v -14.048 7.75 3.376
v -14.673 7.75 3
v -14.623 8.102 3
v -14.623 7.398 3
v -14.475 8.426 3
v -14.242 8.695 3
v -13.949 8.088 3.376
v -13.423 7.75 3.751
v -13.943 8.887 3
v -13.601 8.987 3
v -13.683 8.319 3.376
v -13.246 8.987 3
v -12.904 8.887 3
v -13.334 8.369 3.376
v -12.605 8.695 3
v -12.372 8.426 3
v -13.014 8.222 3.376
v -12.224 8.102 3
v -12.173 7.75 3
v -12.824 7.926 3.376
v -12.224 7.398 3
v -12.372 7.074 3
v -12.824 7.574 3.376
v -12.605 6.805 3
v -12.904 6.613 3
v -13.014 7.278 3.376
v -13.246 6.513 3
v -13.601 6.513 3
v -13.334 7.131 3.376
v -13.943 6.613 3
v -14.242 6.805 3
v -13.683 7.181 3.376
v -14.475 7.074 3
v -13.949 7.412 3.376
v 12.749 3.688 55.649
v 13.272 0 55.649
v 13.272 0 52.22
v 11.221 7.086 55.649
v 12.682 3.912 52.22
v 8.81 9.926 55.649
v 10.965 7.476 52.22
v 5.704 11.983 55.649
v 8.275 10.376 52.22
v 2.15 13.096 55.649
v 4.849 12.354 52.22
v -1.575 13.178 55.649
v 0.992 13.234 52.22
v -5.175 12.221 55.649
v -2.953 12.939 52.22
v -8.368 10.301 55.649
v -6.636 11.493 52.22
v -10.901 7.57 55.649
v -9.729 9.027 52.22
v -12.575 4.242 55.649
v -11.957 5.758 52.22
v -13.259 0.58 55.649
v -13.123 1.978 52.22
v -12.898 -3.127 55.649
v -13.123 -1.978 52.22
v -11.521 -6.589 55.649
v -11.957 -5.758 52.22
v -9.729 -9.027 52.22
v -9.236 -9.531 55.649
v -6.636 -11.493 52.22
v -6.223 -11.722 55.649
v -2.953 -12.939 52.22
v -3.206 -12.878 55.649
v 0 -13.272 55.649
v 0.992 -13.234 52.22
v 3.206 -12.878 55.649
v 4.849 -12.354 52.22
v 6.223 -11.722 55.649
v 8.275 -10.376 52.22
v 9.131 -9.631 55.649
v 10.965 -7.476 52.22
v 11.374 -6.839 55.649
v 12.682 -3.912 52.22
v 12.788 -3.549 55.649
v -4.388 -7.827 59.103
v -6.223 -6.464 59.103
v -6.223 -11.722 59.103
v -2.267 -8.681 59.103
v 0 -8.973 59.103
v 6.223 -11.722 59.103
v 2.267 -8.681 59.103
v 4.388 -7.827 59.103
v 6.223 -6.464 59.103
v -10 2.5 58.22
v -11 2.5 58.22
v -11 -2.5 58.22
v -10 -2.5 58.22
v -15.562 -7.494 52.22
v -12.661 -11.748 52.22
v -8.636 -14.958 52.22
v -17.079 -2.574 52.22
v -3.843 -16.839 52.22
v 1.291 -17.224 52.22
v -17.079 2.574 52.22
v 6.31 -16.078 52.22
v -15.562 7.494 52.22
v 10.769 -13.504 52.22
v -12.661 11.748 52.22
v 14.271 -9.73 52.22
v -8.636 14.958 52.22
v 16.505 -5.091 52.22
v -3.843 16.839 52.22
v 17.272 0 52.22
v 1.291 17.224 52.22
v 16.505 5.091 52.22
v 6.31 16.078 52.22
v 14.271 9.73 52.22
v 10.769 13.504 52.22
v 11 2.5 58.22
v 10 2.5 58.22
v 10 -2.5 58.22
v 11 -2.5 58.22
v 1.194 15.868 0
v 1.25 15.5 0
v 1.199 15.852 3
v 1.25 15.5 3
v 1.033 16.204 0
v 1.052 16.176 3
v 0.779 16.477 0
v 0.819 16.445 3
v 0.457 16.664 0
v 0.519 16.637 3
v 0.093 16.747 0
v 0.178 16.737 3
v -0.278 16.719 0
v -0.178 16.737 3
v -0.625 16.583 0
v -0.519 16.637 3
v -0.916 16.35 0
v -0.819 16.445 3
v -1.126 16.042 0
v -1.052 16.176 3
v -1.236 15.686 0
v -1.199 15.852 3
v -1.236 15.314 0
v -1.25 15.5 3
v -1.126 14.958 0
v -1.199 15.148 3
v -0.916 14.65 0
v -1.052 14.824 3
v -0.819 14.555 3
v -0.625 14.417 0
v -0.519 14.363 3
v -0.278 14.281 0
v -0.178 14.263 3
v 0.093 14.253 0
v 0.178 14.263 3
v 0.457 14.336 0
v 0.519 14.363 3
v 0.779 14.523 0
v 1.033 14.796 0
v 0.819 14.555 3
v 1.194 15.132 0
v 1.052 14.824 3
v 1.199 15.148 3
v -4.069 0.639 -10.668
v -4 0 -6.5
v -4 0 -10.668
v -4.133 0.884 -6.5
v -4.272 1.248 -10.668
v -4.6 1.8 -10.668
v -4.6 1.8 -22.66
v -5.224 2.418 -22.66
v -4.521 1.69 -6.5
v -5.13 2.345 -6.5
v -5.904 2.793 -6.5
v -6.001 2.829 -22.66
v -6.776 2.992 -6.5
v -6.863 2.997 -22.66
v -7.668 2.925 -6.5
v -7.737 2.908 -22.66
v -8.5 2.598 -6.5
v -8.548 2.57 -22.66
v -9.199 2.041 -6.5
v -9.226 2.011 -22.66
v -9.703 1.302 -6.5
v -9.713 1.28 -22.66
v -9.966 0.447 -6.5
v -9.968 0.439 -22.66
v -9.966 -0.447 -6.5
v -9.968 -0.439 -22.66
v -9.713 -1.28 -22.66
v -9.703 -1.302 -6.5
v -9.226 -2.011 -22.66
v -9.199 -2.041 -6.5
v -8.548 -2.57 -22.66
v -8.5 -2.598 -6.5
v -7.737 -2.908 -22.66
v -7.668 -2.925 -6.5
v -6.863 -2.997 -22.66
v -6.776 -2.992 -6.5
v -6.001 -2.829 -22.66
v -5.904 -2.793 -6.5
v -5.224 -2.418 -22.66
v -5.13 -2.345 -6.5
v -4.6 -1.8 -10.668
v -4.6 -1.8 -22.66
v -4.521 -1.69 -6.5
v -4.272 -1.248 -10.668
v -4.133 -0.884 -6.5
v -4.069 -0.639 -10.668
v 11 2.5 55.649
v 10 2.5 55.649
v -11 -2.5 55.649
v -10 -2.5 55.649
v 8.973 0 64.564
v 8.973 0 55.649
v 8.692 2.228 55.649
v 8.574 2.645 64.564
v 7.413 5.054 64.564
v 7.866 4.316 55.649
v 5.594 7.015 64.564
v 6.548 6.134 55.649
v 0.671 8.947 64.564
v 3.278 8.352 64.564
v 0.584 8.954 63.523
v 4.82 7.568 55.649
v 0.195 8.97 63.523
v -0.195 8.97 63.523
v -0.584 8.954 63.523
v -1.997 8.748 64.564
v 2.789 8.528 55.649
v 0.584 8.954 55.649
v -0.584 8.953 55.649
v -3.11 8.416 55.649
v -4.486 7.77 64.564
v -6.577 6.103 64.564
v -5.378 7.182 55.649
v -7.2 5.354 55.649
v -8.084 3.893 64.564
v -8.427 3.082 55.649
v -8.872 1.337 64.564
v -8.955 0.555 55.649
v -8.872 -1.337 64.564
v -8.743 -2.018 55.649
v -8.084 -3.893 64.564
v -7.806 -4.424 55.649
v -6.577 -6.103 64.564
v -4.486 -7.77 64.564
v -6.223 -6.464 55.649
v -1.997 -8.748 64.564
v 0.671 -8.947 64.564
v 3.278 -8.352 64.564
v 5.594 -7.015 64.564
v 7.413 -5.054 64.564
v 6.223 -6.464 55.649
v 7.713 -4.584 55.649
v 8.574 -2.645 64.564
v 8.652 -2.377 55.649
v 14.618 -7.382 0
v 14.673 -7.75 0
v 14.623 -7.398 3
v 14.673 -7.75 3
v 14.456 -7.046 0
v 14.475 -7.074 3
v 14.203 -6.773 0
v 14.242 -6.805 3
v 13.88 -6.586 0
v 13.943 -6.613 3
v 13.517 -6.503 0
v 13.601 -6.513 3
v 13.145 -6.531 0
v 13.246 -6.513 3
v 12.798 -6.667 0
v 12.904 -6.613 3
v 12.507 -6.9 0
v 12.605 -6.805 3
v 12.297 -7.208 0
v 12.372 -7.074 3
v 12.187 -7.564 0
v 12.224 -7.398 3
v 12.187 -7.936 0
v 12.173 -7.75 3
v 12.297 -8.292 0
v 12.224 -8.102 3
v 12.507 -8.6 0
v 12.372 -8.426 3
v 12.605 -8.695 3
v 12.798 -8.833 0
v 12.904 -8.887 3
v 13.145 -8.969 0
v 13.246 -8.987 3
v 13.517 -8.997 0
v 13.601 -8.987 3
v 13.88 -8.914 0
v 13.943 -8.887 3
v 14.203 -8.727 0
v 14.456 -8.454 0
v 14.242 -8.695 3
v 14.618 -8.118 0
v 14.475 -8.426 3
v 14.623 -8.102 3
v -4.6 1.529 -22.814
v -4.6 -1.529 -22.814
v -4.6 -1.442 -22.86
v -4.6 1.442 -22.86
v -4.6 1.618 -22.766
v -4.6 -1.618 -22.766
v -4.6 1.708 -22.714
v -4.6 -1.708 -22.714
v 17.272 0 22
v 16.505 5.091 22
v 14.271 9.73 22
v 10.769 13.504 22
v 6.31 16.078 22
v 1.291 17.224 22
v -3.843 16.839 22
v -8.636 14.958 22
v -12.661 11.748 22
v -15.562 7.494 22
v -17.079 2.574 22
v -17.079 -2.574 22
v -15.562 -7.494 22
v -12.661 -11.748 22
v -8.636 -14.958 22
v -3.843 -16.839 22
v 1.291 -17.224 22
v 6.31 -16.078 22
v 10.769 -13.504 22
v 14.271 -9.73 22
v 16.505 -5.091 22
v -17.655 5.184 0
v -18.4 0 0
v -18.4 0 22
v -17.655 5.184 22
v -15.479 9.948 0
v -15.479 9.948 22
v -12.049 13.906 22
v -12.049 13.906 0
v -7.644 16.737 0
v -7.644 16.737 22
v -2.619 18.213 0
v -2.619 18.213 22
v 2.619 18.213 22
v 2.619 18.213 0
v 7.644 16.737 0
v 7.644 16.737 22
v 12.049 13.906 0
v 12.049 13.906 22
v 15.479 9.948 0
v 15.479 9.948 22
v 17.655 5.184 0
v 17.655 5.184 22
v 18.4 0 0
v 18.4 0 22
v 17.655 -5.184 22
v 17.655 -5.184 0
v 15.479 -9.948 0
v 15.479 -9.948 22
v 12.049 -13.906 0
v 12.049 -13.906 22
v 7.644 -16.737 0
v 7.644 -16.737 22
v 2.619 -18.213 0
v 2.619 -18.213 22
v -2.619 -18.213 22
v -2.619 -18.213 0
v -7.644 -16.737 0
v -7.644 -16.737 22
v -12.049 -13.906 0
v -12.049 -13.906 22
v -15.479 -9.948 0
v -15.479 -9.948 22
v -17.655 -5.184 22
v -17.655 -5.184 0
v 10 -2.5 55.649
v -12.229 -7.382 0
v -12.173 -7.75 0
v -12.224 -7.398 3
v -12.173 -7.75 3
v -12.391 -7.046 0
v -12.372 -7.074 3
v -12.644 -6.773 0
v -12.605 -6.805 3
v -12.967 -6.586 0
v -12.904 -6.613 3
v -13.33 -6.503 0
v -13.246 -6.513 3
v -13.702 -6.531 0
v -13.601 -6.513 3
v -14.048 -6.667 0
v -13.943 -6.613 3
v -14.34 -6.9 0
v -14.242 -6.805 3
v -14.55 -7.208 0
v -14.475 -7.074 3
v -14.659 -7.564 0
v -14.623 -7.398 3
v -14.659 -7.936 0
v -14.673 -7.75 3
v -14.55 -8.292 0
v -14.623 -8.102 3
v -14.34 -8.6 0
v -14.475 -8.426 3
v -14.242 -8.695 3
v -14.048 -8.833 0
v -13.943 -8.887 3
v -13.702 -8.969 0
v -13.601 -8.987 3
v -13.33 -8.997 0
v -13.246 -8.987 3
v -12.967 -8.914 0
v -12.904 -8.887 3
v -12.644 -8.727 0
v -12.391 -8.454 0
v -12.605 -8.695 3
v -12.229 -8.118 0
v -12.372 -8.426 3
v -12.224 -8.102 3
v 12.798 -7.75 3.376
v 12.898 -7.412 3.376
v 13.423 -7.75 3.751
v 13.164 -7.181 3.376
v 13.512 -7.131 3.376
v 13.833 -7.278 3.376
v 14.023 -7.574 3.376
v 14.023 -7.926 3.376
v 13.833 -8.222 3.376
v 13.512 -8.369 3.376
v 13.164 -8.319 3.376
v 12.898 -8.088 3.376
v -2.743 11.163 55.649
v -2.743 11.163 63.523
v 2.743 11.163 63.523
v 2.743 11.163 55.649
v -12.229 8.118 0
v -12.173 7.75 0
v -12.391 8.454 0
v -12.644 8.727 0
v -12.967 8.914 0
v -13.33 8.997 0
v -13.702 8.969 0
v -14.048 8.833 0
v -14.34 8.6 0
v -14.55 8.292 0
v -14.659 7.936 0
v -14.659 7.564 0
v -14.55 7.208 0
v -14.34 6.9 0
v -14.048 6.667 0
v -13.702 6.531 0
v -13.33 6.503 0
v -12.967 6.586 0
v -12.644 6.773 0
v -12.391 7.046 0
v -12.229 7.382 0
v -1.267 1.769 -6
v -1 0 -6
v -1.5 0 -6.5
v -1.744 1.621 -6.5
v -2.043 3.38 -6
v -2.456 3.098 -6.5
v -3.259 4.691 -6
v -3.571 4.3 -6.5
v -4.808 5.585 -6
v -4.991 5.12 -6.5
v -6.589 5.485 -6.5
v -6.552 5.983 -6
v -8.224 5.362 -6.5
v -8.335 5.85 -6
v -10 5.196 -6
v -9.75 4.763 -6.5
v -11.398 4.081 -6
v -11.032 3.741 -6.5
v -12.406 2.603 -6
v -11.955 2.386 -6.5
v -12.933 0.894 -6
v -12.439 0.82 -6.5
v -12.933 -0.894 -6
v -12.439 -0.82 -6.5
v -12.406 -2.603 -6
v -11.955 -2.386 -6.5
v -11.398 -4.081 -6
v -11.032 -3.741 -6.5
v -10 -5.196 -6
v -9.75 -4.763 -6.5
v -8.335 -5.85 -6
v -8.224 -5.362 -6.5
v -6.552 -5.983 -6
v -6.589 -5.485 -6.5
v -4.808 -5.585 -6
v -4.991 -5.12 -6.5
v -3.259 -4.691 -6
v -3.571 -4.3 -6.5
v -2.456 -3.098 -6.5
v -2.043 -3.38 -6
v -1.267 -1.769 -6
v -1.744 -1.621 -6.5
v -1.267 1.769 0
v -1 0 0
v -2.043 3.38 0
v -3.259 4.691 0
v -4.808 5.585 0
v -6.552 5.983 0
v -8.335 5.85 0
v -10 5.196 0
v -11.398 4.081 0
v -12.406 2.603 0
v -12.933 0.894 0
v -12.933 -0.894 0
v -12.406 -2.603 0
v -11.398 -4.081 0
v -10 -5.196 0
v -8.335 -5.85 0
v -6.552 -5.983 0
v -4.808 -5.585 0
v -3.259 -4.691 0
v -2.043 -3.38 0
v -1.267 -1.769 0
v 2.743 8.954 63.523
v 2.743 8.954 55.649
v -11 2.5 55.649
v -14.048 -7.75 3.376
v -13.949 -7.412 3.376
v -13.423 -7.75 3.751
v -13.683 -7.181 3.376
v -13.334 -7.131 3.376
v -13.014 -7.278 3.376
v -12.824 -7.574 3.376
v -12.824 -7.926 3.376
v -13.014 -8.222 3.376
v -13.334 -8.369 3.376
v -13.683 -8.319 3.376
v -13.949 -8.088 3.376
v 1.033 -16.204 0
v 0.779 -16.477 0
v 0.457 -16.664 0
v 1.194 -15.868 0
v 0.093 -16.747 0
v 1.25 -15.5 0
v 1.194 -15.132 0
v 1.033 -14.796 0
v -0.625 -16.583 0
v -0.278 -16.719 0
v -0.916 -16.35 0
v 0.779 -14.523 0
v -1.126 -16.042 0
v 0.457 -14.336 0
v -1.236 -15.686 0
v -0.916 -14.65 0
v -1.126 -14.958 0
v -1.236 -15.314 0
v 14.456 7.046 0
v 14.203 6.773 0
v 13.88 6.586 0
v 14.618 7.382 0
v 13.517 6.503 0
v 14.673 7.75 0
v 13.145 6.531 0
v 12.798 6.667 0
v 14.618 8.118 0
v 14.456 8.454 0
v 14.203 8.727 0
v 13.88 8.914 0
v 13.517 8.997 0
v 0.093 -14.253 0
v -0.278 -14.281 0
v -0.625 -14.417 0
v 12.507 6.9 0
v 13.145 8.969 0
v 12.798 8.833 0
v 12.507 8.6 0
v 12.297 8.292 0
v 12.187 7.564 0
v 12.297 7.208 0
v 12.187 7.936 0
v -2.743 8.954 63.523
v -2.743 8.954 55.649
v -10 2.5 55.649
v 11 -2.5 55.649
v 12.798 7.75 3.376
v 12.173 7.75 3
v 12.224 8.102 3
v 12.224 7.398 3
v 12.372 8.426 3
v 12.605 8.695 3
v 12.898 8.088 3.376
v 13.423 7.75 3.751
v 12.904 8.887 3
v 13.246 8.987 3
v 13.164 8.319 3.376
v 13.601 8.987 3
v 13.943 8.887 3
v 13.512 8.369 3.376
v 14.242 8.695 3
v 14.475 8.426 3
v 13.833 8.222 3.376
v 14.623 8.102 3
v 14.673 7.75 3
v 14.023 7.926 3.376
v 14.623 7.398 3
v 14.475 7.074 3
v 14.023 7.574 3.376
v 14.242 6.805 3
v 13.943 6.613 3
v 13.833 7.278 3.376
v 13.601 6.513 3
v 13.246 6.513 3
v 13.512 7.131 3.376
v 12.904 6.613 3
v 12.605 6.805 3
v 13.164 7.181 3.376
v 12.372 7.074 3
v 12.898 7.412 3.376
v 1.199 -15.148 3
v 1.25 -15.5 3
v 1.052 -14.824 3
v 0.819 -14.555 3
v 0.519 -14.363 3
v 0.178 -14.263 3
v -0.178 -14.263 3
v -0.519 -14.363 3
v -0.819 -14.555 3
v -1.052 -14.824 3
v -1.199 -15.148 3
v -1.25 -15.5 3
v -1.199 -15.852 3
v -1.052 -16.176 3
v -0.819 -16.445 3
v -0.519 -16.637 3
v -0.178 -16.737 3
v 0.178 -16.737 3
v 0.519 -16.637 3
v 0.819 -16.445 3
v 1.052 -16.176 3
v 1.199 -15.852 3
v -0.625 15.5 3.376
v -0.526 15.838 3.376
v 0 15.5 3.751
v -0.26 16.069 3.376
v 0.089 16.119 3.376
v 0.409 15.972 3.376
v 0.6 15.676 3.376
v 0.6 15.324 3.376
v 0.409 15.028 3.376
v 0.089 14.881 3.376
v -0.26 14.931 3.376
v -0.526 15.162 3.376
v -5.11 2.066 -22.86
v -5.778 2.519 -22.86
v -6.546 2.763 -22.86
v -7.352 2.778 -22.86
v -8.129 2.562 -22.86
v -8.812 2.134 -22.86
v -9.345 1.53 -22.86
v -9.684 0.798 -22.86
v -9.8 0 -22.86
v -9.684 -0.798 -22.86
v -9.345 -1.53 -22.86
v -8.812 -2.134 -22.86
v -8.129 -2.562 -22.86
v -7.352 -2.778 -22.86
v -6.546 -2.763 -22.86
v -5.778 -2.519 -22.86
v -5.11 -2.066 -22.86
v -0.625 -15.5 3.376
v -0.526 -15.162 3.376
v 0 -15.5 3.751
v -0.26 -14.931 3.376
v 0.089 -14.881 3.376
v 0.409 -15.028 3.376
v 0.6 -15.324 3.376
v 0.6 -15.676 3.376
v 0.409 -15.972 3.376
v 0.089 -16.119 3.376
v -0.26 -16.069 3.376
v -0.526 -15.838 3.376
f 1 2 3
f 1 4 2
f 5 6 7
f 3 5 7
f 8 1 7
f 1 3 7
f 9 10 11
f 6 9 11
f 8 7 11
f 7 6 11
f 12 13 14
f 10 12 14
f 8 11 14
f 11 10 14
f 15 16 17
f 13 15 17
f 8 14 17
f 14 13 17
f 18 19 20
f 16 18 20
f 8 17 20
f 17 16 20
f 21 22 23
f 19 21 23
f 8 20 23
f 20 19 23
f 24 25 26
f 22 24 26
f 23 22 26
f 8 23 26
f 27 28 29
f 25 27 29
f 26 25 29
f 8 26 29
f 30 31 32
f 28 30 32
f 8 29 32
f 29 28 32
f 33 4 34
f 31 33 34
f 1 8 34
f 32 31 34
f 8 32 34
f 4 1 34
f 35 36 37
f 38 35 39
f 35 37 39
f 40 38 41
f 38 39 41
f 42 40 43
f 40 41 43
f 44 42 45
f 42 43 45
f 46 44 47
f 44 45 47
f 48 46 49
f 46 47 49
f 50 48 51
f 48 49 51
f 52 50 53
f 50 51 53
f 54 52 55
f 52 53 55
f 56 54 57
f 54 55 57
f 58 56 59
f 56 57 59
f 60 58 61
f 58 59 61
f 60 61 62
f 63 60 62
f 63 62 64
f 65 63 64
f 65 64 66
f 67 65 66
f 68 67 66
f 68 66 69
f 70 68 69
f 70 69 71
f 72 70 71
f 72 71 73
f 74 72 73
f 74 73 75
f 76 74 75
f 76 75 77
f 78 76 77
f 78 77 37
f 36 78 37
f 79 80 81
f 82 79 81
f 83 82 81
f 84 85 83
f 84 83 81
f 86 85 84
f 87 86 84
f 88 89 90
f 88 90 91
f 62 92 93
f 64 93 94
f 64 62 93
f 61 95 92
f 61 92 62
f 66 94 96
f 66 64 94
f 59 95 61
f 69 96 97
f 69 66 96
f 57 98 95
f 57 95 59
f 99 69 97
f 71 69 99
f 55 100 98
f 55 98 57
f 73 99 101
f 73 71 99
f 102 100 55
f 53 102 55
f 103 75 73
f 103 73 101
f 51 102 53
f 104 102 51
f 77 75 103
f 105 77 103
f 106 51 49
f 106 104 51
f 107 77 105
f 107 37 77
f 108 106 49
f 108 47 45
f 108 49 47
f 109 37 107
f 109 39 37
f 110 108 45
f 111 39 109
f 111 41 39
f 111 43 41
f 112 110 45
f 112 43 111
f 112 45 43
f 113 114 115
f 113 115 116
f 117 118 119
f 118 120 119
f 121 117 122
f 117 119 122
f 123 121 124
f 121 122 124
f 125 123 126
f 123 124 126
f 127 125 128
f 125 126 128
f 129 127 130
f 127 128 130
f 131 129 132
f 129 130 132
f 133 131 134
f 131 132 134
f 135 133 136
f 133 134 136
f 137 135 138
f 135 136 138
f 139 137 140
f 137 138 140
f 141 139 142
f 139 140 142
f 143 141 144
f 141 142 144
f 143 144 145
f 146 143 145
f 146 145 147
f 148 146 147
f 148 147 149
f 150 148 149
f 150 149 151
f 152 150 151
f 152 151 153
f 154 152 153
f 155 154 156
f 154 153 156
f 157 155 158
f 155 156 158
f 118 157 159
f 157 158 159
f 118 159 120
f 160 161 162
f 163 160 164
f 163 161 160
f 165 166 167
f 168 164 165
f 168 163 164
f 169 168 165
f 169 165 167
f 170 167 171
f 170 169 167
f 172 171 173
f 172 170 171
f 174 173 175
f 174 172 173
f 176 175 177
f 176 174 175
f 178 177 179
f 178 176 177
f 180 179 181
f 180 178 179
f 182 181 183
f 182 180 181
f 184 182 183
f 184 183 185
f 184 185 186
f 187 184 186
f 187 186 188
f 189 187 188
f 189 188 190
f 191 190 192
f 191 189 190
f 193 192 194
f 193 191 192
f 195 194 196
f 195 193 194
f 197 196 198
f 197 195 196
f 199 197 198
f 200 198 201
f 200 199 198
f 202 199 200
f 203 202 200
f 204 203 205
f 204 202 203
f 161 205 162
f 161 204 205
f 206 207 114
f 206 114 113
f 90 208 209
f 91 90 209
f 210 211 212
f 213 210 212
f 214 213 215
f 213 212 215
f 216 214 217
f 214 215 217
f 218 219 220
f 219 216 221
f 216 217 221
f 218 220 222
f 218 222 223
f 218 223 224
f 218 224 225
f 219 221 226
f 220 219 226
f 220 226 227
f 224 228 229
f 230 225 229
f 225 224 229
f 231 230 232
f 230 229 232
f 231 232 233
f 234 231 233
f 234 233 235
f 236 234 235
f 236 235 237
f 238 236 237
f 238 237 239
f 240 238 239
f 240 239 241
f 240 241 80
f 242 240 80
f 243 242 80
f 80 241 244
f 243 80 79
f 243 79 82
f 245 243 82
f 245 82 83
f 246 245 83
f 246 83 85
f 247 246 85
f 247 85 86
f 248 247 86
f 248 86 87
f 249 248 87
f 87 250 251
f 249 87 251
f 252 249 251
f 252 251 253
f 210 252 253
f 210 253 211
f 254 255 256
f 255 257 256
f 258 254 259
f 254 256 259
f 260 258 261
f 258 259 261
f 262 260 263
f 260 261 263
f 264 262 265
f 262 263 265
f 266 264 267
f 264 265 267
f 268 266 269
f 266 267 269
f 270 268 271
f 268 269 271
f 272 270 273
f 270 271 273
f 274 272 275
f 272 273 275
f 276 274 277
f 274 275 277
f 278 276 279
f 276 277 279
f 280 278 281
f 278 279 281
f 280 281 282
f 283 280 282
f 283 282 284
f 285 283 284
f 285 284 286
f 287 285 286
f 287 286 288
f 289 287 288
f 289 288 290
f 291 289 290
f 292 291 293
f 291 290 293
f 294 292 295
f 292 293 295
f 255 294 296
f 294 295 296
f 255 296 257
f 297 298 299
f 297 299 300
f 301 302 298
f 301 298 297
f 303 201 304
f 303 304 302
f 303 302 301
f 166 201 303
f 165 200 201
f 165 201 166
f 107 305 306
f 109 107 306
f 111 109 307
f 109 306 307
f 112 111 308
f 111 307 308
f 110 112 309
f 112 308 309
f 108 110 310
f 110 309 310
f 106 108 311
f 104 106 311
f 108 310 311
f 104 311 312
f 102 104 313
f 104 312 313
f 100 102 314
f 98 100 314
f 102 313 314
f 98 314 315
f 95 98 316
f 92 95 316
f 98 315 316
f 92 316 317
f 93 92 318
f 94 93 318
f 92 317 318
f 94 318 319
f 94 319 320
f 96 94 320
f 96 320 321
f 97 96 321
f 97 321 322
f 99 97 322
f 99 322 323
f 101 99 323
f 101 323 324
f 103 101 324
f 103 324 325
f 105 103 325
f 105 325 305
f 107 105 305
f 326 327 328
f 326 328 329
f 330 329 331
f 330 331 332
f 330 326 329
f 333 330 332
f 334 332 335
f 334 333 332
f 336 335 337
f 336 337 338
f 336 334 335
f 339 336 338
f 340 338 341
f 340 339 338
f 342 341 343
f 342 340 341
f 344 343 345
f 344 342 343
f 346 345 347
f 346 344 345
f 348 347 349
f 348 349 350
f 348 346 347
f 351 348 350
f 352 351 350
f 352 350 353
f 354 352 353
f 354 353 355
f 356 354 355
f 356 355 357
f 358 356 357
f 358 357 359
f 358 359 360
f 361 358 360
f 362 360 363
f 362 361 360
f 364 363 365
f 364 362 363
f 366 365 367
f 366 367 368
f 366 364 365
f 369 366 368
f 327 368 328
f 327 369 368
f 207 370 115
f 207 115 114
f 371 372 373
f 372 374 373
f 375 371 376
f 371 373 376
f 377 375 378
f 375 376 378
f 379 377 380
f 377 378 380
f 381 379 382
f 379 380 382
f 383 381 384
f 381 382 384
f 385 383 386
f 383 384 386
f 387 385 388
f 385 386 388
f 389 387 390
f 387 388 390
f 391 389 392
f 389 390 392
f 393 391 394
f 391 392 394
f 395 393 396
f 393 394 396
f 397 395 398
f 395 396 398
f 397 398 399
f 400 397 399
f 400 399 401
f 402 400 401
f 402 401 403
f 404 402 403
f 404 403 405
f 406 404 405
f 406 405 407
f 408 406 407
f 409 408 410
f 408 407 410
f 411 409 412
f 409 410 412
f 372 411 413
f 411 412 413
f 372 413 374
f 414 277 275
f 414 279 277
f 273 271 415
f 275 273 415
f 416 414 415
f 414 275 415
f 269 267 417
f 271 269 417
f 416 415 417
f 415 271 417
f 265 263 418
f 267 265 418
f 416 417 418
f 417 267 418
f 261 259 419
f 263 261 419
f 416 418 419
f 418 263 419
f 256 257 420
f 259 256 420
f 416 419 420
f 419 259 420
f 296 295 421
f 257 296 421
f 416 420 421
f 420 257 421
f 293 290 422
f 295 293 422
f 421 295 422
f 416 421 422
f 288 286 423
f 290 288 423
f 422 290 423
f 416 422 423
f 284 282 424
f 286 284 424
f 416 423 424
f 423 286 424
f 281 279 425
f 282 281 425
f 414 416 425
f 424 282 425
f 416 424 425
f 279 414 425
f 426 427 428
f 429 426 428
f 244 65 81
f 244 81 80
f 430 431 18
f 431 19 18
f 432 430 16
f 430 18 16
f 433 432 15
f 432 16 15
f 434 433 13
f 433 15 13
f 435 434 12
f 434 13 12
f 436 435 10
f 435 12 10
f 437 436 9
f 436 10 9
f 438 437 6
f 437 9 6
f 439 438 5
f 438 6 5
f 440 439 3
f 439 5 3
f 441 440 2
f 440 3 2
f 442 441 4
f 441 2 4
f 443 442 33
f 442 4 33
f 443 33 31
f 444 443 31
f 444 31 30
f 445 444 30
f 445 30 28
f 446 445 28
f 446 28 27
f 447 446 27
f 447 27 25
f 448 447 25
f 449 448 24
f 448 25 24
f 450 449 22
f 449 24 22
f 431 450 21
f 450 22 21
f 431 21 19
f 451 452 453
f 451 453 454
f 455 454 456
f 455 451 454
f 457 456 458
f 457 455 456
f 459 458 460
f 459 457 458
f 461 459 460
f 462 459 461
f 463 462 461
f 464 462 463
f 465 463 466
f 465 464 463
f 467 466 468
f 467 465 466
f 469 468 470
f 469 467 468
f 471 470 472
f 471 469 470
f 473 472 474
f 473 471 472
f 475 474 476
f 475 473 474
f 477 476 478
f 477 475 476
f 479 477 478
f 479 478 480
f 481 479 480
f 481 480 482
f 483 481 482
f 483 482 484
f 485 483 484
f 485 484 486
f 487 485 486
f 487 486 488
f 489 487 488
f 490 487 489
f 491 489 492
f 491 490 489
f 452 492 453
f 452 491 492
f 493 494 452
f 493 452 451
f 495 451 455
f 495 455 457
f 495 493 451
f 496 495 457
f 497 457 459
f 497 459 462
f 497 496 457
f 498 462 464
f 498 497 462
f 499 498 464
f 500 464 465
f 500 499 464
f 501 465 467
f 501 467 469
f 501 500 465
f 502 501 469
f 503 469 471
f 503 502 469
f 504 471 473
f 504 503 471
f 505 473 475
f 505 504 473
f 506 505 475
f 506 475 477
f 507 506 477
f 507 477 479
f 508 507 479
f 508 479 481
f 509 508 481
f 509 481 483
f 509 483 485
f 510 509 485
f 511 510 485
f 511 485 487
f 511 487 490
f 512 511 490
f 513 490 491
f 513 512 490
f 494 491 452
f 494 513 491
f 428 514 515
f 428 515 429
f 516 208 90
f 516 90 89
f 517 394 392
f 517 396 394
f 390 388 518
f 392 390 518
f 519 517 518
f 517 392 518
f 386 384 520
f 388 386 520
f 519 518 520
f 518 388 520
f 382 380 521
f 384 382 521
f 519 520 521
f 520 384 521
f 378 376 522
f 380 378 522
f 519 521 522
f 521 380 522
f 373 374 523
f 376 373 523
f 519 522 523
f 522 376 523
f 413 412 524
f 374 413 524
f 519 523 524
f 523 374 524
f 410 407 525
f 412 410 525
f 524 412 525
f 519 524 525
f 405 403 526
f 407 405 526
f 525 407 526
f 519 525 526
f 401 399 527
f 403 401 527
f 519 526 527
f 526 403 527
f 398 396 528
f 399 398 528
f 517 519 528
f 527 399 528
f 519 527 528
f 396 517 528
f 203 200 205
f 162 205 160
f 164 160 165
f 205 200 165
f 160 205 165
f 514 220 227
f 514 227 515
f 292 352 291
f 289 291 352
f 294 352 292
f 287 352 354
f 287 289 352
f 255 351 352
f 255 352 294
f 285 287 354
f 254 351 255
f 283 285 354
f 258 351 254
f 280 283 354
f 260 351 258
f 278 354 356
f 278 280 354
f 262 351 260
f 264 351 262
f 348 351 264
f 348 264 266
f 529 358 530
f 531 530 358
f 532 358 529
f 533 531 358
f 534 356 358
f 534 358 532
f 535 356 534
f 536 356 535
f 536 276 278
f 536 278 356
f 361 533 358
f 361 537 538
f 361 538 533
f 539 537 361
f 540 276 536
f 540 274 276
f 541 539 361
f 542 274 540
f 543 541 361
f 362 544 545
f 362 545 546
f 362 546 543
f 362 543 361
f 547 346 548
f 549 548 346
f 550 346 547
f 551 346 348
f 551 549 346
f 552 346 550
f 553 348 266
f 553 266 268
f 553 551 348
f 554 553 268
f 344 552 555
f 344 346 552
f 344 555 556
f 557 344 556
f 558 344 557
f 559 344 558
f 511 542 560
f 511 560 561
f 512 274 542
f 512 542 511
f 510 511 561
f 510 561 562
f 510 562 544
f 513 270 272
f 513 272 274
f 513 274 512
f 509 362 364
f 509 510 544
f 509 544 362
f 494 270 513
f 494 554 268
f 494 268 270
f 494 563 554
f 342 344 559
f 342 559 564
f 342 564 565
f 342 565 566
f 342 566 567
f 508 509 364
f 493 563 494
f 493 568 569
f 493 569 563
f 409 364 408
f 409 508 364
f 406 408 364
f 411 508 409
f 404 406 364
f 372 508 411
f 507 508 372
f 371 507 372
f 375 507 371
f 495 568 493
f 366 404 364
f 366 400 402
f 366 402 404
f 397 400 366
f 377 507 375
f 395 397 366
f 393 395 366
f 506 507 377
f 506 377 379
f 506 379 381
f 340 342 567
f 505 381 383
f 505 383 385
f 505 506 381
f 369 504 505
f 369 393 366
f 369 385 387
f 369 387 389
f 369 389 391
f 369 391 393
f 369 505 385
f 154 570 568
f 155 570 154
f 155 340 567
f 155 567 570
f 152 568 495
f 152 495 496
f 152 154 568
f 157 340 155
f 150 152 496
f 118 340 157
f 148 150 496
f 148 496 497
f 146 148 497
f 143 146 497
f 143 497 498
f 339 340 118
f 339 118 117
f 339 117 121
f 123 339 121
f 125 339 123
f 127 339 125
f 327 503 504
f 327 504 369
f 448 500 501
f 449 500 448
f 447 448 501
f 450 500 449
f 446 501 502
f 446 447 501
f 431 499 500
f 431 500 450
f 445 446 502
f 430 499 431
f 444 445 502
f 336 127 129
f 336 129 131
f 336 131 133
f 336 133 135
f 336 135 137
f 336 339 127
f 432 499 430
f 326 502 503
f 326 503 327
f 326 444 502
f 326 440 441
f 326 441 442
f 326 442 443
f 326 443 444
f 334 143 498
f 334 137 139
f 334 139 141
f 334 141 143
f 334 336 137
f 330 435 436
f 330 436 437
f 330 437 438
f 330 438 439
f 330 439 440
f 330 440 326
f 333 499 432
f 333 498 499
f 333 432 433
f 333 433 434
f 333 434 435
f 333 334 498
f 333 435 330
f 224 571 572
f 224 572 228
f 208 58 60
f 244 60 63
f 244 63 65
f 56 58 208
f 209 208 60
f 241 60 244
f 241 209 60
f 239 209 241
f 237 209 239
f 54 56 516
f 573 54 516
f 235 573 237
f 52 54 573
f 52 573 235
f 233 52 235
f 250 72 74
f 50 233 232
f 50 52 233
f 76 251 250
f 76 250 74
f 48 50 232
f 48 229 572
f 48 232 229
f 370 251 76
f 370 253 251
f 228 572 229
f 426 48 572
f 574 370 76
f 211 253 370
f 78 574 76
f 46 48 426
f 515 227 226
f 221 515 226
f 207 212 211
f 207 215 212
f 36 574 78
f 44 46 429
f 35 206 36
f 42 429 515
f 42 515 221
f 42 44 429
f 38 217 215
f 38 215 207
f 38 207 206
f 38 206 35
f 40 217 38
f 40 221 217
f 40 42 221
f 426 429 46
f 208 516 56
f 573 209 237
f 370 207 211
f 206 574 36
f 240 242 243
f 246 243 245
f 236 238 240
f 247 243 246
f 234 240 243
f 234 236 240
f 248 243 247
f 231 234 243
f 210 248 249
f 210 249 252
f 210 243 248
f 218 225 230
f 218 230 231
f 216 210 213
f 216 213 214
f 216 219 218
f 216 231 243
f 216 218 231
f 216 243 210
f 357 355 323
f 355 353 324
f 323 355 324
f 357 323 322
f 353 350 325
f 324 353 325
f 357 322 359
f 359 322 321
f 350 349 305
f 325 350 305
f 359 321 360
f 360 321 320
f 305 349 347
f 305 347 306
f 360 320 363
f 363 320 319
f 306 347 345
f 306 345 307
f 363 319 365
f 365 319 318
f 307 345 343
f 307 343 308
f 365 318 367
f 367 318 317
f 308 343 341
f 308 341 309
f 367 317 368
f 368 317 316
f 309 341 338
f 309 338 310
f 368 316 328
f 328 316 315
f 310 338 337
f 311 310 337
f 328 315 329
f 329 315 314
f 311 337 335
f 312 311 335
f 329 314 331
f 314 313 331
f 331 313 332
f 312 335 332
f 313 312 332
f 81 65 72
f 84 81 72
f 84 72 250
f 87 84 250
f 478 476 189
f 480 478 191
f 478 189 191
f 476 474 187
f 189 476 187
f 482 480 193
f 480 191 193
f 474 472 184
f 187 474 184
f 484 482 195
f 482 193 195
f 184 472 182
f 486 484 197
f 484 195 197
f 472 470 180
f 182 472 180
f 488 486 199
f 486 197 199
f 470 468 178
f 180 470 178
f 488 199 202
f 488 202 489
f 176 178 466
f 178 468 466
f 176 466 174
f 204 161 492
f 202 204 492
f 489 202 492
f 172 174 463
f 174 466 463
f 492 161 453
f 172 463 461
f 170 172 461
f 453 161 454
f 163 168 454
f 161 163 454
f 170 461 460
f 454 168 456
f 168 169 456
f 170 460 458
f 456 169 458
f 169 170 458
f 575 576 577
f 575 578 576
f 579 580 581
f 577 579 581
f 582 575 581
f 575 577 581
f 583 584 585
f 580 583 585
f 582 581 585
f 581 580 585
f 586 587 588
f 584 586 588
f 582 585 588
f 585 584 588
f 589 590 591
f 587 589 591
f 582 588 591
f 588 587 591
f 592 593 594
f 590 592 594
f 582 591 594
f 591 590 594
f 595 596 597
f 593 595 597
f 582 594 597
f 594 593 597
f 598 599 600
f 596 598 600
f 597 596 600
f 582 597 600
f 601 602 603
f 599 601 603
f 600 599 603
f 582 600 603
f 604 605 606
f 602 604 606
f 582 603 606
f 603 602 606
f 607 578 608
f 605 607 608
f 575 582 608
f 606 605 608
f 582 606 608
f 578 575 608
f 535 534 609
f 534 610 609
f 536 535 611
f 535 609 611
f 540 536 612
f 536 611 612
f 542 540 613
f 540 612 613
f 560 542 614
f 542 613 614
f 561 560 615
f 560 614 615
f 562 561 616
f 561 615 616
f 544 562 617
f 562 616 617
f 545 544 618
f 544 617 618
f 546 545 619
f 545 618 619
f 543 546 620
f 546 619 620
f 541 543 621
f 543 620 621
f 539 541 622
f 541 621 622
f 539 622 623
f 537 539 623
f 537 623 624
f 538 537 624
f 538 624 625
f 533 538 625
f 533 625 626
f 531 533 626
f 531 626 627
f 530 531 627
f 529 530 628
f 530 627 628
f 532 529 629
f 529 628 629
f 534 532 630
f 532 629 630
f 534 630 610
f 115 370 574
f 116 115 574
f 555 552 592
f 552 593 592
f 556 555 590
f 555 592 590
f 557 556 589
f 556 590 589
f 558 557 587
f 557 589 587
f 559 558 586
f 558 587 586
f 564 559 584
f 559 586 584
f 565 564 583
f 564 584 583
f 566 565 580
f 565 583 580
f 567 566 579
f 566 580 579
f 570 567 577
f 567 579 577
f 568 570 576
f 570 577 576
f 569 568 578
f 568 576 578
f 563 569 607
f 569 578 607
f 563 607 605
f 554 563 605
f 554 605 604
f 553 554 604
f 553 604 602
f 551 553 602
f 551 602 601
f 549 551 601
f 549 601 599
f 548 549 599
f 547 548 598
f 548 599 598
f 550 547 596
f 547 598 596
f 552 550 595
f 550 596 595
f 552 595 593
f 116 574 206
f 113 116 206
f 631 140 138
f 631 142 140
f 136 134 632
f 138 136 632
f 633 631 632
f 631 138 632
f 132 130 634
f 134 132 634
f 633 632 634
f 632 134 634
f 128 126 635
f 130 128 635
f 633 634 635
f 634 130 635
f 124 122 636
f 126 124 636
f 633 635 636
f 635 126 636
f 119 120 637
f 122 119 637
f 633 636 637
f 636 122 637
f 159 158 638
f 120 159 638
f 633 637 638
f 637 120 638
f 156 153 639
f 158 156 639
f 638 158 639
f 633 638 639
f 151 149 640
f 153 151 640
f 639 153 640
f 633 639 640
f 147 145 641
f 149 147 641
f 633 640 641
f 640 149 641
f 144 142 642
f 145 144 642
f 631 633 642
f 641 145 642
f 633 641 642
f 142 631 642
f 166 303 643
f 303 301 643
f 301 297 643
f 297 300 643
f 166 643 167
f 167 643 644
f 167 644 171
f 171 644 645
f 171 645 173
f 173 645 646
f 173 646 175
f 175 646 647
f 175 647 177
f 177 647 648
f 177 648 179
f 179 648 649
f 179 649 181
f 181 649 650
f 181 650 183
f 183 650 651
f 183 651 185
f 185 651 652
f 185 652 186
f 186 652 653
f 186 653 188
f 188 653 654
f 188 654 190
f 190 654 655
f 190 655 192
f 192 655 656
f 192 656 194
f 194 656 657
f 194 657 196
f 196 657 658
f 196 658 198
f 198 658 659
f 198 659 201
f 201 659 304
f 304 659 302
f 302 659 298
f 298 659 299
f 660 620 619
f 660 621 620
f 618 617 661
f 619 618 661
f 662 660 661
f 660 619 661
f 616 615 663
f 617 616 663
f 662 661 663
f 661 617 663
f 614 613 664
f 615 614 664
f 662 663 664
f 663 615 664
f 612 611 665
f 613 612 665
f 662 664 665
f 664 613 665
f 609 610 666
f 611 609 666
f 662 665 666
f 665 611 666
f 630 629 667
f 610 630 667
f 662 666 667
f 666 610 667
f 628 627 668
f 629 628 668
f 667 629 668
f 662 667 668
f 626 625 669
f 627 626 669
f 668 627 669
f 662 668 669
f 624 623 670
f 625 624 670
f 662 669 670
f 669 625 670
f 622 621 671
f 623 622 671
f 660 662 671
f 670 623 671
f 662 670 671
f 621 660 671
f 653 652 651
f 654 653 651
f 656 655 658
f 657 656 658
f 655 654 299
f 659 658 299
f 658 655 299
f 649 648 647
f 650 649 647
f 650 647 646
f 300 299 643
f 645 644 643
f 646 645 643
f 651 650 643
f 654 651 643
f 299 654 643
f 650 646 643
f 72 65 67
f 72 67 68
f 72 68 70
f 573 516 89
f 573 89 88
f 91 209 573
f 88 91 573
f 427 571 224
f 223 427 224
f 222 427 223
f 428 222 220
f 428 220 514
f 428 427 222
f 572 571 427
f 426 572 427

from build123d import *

# Parameters (mm, degrees)
SKETCH1_R                   = 17.272
BOSS_EXTRUDE1_DEPTH         = 52.22
SKETCH1_3_R                 = 6
BOSS_EXTRUDE2_DEPTH         = 6.5
BOSS_EXTRUDE3_DEPTH         = 22.86
BOSS_EXTRUDE4_DEPTH         = 10.668
SKETCH2_W                   = 1
SKETCH2_H                   = 5
BOSS_EXTRUDE5_DEPTH         = 6
SKETCH4_R                   = 18.4
BOSS_EXTRUDE6_DEPTH         = 22
TAP_DRILL_FOR_M3_TAP1_D     = 2.5
TAP_DRILL_FOR_M3_TAP1_DEPTH = 3
TAP_DRILL_FOR_M3_TAP1_TIP   = 0.751075774
SKETCH9_R                   = 13.2715
BOSS_EXTRUDE7_DEPTH         = 3.429
SKETCH10_R                  = 8.97255
BOSS_EXTRUDE8_DEPTH         = 8.9154
SKETCH11_W                  = 12.446
SKETCH11_H                  = 6.0452
BOSS_EXTRUDE9_DEPTH         = 3.4544
SKETCH12_W                  = 5.4864
SKETCH12_H                  = 2.2098
BOSS_EXTRUDE10_DEPTH        = 7.874
CHAMFER1_SIZE               = 0.2
CHAMFER2_SIZE               = 0.5


with BuildPart() as part:
    # Sketch1 → Boss-Extrude1 (new body)
    with BuildSketch(Plane.XY):
        Circle(SKETCH1_R)
    extrude(amount=BOSS_EXTRUDE1_DEPTH)

    # Sketch1<3> → Boss-Extrude2 (add)
    with BuildSketch(Plane.XY):
        with Locations((-7, 0)):
            Circle(SKETCH1_3_R)
    extrude(amount=-BOSS_EXTRUDE2_DEPTH)

    # Sketch1<4> → Boss-Extrude3 (add)
    with BuildSketch(Plane.XY):
        with BuildLine():
            Line((-4.6, -1.8), (-4.6, 1.8))
            ThreePointArc((-4.6, 1.8), (-10, 0), (-4.6, -1.8))
        make_face()
    extrude(amount=-BOSS_EXTRUDE3_DEPTH)

    # Sketch1<5> → Boss-Extrude4 (add)
    with BuildSketch(Plane.XY):
        with BuildLine():
            ThreePointArc((-4.6, -1.8), (-4, 0), (-4.6, 1.8))
            Line((-4.6, 1.8), (-4.6, -1.8))
        make_face()
    extrude(amount=-BOSS_EXTRUDE4_DEPTH)

    # Sketch2 → Boss-Extrude5 (add)
    with BuildSketch(Plane.XY.offset(52.22)):
        with Locations((-10.5, 0)):
            Rectangle(SKETCH2_W, SKETCH2_H)
        with Locations((10.5, 0)):
            Rectangle(SKETCH2_W, SKETCH2_H)
    extrude(amount=BOSS_EXTRUDE5_DEPTH)

    # Sketch4 → Boss-Extrude6 (add)
    with BuildSketch(Plane(origin=(0, 0, 0), x_dir=(-1, 0, 0), z_dir=(0, 0, -1))):
        Circle(SKETCH4_R)
    extrude(amount=-BOSS_EXTRUDE6_DEPTH)

    # Tap Drill for M3 Tap1
    with Locations(Plane(origin=(0, 0, 0), x_dir=(-1, 0, 0), z_dir=(0, 0, -1))):
        with Locations((-13.423393759, -7.75), (0, -15.5), (0, 15.5), (13.423393759, 7.75), (13.423393759, -7.75), (-13.423393759, 7.75)):
            Hole(TAP_DRILL_FOR_M3_TAP1_D / 2, depth=TAP_DRILL_FOR_M3_TAP1_DEPTH)
            with Locations((0, 0, -(TAP_DRILL_FOR_M3_TAP1_DEPTH + TAP_DRILL_FOR_M3_TAP1_TIP / 2))):  # 118° drill point
                Cone(0, TAP_DRILL_FOR_M3_TAP1_D / 2, TAP_DRILL_FOR_M3_TAP1_TIP, mode=Mode.SUBTRACT)

    # Sketch9 → Boss-Extrude7 (add)
    with BuildSketch(Plane.XY.offset(52.22)):
        Circle(SKETCH9_R)
    extrude(amount=BOSS_EXTRUDE7_DEPTH)

    # Sketch10 → Boss-Extrude8 (add)
    with BuildSketch(Plane.XY.offset(55.649)):
        Circle(SKETCH10_R)
    extrude(amount=BOSS_EXTRUDE8_DEPTH)

    # Sketch11 → Boss-Extrude9 (add)
    with BuildSketch(Plane.XY.offset(55.649)):
        with Locations((0, -8.699472481)):
            Rectangle(SKETCH11_W, SKETCH11_H)
    extrude(amount=BOSS_EXTRUDE9_DEPTH)

    # Sketch12 → Boss-Extrude10 (add)
    with BuildSketch(Plane.XY.offset(55.649)):
        with Locations((0, 10.0584)):
            Rectangle(SKETCH12_W, SKETCH12_H)
    extrude(amount=BOSS_EXTRUDE10_DEPTH)

    # Chamfer1
    chamfer1_edges = [part.edges().sort_by_distance(p)[0] for p in [
        (-10, 0, -22.86),
    ]]
    chamfer(chamfer1_edges, length=CHAMFER1_SIZE)

    # Chamfer2
    chamfer2_edges = [part.edges().sort_by_distance(p)[0] for p in [
        (-13, 0, -6.5),
    ]]
    chamfer(chamfer2_edges, length=CHAMFER2_SIZE)


solid = part.part
